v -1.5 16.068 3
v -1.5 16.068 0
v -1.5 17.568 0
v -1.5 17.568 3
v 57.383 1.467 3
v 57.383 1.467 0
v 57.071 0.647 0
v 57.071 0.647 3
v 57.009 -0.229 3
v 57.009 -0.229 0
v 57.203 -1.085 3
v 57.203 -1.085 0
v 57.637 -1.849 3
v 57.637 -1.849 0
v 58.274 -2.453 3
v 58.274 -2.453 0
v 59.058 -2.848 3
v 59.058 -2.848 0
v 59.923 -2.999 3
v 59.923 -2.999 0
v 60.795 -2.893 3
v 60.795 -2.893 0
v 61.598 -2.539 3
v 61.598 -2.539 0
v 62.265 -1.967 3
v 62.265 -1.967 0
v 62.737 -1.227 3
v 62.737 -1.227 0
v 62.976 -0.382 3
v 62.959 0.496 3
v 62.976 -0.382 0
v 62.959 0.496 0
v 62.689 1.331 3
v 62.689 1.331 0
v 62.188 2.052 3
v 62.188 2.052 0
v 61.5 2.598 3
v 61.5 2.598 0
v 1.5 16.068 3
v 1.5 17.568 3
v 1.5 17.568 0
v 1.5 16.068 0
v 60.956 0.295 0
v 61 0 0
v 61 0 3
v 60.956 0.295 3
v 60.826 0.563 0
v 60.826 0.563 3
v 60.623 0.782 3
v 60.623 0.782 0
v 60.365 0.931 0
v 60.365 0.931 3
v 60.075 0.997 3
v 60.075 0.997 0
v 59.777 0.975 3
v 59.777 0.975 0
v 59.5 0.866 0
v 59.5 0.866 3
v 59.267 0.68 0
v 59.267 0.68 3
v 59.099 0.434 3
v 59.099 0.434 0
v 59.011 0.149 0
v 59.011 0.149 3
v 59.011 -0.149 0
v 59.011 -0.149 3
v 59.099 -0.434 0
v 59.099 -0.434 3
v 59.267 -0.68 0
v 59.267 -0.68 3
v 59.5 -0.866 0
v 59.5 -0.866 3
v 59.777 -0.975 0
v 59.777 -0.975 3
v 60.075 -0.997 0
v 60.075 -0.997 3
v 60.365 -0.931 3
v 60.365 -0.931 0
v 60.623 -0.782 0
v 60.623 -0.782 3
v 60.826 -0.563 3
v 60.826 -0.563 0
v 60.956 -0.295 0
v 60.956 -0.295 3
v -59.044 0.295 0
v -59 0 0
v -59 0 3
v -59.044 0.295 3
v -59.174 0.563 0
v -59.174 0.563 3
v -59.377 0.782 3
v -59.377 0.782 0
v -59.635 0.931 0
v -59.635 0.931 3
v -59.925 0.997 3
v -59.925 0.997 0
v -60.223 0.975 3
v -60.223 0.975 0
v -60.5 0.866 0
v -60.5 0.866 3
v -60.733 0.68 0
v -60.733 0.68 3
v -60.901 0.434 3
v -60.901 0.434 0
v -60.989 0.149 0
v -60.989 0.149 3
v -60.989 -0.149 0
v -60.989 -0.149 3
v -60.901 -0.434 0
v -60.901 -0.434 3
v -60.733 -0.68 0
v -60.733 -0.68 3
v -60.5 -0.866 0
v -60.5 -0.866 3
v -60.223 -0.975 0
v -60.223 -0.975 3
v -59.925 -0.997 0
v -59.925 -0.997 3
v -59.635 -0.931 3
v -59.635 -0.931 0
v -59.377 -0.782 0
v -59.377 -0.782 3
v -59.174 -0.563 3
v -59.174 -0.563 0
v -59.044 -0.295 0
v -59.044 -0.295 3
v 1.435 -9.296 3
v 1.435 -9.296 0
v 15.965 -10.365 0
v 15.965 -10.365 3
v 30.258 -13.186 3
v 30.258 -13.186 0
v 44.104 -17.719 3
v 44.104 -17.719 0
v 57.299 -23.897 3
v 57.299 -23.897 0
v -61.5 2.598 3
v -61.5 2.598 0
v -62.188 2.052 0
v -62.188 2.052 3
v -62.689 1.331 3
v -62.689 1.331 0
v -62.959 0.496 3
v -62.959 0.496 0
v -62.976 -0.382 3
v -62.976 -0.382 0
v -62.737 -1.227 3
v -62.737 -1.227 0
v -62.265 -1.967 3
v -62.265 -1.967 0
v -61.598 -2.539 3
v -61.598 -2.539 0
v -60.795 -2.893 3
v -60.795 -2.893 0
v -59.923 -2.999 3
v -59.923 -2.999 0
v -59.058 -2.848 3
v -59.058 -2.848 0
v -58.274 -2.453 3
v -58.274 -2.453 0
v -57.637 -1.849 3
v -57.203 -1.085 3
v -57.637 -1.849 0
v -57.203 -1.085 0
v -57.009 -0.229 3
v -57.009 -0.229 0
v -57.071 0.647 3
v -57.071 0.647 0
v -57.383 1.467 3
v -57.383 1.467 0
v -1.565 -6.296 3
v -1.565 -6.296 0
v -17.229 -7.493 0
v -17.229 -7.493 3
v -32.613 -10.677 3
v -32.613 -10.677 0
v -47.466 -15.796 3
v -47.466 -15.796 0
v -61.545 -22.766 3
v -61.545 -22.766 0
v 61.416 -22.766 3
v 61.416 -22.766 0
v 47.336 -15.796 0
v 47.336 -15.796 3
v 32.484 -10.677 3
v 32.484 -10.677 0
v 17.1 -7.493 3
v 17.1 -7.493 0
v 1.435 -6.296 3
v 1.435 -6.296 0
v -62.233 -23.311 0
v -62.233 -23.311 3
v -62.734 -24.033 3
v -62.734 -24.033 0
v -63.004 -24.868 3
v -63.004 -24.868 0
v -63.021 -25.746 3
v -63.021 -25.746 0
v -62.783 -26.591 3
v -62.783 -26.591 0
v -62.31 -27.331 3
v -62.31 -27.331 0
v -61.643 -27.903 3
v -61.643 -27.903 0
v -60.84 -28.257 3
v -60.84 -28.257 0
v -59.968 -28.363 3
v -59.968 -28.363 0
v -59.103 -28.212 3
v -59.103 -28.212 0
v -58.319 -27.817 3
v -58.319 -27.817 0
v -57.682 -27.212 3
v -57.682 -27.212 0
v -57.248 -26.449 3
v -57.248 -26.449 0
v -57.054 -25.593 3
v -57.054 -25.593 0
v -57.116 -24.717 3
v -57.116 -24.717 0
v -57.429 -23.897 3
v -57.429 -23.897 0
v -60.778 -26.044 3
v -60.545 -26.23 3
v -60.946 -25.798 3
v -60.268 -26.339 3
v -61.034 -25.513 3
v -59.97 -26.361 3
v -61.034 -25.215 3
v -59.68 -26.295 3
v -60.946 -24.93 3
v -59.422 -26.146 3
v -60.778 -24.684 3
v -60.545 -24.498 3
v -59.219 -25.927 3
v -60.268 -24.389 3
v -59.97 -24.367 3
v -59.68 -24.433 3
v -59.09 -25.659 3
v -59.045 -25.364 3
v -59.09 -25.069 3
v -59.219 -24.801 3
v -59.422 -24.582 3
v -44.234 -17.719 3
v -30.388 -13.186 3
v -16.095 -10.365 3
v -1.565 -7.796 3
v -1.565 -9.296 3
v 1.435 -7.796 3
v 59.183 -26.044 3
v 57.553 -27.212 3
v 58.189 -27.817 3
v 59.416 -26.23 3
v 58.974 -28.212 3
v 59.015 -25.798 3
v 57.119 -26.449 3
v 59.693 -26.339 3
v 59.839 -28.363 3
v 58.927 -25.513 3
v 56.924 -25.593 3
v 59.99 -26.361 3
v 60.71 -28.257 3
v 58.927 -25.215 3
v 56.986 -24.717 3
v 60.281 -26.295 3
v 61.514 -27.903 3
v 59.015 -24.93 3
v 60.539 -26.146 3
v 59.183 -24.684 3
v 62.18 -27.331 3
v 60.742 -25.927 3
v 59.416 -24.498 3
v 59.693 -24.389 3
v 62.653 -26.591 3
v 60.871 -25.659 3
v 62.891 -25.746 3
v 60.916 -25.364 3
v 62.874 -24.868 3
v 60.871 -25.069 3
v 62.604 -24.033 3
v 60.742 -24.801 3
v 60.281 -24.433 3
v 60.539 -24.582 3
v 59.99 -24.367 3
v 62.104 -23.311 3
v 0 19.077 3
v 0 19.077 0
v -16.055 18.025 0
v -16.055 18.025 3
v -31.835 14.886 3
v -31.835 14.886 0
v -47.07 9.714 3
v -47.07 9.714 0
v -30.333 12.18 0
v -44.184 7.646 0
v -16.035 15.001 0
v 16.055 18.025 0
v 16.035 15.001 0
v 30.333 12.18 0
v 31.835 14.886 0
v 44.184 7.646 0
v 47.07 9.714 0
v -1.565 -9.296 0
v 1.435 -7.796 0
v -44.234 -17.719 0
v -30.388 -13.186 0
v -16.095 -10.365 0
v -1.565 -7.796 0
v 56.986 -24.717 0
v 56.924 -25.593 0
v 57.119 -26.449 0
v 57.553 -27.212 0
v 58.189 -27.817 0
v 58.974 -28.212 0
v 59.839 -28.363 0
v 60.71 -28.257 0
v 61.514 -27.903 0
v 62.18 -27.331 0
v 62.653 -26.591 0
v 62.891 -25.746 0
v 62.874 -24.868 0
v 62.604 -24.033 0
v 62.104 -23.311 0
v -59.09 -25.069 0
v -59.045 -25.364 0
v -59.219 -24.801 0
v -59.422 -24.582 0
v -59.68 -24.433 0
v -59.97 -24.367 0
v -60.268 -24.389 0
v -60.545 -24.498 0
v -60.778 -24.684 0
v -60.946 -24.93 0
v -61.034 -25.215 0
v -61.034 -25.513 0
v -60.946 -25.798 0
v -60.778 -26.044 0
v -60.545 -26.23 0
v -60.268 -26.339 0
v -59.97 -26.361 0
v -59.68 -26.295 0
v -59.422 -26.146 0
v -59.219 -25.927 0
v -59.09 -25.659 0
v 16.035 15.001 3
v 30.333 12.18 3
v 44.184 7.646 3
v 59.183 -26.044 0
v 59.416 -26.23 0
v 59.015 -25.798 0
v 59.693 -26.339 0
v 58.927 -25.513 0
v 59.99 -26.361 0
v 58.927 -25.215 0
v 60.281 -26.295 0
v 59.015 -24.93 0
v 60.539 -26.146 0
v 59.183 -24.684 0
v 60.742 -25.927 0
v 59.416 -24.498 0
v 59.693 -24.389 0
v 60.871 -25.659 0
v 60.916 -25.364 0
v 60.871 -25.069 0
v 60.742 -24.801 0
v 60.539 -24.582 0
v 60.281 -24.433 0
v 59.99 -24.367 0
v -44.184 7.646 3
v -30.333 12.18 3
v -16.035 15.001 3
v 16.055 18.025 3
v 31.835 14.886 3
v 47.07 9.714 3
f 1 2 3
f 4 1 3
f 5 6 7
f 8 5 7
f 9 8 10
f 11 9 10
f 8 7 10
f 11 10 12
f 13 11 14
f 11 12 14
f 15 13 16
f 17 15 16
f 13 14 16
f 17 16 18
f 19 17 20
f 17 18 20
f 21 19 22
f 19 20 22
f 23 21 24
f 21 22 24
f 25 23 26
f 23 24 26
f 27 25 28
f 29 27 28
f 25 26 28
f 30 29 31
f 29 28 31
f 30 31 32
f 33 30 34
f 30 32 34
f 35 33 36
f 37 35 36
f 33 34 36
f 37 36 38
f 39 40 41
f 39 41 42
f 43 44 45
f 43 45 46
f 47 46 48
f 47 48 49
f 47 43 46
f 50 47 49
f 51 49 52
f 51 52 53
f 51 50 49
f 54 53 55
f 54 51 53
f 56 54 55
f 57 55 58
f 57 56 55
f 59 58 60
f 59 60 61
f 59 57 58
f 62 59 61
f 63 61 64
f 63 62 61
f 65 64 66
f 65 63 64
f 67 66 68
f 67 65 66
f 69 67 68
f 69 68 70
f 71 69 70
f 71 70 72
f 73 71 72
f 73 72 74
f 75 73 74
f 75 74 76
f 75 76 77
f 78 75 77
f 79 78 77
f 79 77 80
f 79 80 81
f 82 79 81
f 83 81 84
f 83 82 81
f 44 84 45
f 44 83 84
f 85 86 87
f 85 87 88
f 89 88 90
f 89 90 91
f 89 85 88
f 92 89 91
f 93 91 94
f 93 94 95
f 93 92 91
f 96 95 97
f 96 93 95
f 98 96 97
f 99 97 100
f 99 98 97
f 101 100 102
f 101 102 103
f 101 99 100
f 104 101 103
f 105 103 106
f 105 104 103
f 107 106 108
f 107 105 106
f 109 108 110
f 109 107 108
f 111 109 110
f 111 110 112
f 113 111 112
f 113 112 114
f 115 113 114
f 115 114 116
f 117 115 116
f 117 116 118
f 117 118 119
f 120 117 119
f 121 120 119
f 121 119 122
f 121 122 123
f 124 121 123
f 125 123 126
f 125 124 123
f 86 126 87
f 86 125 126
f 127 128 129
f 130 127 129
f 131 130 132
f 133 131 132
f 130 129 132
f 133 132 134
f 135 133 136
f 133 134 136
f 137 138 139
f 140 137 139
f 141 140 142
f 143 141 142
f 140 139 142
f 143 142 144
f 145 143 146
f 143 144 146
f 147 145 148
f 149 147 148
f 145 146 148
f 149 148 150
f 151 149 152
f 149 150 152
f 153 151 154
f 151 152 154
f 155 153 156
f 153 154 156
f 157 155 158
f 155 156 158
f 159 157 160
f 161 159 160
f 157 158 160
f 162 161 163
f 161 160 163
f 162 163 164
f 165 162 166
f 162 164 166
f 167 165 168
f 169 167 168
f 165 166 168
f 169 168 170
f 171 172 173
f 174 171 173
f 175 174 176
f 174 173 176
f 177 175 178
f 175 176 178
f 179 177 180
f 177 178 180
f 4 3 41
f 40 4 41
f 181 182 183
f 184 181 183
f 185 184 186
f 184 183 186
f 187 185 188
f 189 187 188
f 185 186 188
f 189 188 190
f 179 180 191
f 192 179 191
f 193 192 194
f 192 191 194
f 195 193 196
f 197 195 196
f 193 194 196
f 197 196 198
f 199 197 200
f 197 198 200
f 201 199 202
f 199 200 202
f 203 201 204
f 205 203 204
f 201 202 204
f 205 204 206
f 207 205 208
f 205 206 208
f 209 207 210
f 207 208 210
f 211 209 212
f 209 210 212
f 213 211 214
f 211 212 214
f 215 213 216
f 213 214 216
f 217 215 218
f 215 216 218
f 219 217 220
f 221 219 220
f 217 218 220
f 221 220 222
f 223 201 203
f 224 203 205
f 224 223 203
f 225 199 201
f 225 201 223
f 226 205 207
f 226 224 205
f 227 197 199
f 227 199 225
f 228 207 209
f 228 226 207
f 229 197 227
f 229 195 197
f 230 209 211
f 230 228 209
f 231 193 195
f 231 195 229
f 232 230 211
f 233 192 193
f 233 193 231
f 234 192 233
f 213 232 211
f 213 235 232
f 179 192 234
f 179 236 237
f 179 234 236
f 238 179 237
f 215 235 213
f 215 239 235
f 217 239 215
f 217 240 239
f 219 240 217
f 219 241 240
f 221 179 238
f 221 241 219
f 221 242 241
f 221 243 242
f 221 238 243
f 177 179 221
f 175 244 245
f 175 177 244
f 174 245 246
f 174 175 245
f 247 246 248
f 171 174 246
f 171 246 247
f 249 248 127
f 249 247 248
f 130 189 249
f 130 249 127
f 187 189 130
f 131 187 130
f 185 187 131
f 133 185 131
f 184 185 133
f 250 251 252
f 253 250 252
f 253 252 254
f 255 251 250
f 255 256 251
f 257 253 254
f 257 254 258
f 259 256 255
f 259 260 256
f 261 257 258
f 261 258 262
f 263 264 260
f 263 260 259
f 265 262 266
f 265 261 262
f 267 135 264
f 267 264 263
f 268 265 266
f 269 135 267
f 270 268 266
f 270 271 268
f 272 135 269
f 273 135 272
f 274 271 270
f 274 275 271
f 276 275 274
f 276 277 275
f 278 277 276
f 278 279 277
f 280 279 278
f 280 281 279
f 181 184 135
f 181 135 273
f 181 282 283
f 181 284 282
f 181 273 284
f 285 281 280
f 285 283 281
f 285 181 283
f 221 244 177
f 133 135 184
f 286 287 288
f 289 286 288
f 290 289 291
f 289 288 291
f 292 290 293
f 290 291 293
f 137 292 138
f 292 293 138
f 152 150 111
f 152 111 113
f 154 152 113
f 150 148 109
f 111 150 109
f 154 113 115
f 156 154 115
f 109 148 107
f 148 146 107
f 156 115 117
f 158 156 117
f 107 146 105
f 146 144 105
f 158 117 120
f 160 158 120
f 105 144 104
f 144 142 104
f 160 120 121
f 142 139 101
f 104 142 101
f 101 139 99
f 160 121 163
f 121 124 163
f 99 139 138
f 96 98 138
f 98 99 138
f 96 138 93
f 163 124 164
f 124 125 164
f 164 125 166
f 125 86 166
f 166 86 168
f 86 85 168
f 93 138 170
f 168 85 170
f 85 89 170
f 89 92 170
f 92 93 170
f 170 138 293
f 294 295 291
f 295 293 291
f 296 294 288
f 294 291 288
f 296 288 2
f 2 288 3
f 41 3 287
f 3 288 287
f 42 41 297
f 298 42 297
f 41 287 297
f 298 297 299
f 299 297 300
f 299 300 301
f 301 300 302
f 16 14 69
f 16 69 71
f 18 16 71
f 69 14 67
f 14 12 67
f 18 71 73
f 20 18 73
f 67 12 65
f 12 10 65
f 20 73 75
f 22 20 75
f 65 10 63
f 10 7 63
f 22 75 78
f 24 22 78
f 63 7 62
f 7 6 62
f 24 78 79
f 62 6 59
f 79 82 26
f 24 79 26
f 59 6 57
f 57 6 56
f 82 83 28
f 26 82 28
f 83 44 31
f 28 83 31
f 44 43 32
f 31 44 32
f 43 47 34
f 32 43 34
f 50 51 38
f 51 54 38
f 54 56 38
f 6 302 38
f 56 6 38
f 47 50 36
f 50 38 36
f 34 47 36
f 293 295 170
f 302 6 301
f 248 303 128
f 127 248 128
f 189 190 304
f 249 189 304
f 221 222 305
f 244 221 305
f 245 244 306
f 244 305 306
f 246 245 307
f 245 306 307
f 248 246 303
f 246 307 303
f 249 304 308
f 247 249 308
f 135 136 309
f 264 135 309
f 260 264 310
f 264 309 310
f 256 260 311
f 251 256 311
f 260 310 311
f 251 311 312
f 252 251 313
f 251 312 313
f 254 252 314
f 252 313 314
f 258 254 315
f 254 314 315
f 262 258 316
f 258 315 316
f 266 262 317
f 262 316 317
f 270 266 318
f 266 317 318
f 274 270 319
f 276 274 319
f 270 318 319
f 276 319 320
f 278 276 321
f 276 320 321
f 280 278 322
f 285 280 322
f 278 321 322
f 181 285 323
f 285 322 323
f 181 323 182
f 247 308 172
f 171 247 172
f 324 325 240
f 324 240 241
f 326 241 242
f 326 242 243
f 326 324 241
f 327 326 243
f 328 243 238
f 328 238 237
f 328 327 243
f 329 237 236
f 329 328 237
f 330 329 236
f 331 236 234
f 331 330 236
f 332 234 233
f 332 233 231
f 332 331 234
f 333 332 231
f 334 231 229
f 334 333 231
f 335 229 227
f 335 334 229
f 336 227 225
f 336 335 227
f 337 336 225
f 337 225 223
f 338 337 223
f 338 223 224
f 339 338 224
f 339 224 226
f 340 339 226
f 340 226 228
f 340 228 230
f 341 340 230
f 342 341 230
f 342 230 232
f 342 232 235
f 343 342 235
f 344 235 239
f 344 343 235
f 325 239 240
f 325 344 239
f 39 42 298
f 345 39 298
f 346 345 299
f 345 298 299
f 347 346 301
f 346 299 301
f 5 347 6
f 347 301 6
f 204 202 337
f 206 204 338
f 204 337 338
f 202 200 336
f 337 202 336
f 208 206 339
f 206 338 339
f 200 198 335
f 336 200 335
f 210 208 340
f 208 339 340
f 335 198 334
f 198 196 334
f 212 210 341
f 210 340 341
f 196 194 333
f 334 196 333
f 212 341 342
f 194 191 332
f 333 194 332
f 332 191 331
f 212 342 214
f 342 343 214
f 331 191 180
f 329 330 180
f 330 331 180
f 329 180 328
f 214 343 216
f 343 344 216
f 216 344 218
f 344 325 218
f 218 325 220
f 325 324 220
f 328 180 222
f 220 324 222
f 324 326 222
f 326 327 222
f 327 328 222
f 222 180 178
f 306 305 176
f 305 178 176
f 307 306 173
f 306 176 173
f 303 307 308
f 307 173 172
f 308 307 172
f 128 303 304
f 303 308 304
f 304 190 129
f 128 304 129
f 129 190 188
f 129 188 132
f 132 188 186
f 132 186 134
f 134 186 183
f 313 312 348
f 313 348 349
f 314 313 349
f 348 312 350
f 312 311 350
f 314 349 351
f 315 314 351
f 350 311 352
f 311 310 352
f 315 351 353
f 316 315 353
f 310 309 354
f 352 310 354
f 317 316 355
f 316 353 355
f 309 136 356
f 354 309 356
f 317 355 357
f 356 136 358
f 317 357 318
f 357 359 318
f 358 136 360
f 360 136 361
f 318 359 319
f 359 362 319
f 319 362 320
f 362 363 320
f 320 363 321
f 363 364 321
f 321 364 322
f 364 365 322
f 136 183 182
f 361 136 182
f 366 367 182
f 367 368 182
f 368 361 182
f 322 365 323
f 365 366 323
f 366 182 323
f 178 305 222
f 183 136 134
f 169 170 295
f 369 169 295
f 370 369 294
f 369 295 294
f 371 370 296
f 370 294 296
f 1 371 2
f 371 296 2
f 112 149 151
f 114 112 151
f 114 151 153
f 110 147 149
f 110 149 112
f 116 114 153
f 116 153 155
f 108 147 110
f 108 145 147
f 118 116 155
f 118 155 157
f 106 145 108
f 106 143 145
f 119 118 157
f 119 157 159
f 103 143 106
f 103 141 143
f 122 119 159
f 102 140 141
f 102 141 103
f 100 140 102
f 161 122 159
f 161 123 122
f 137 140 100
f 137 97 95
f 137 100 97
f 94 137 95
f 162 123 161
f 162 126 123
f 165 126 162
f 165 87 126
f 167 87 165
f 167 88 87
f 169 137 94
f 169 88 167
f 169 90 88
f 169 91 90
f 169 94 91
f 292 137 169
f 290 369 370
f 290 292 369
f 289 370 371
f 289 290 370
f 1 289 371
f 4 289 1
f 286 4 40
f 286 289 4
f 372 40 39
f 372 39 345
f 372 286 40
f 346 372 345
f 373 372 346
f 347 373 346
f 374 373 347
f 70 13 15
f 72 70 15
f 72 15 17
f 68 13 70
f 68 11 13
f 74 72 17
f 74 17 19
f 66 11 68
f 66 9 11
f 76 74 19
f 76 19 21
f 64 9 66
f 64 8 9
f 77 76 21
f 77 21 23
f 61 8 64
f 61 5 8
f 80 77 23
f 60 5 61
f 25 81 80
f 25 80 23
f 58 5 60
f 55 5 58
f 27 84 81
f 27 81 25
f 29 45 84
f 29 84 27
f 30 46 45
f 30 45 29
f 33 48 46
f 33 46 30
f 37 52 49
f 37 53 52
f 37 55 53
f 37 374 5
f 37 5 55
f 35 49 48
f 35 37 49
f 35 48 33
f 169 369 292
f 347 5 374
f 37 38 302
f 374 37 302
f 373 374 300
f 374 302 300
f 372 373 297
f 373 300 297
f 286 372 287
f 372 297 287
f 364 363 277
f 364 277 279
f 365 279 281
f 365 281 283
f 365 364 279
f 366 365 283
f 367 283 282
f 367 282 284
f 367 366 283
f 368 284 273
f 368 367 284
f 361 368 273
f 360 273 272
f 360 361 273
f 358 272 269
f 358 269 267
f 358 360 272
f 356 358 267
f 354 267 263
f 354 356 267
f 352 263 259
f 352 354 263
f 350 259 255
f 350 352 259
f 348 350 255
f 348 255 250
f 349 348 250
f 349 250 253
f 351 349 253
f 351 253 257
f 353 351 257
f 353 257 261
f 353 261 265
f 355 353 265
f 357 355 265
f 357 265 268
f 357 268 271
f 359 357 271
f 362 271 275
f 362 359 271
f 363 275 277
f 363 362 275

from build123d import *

# Parameters (mm, degrees)
F0_R     = 1
F1_DEPTH = 3


with BuildPart() as f1:
    # F0 (on Top) → F1 (new body)
    with BuildSketch(Plane.XY):
        with BuildLine():
            ThreePointArc((61.5, 2.598076), (31.834743, 14.885828), (0, 19.076952))
            ThreePointArc((0, 19.076952), (-31.834743, 14.885828), (-61.5, 2.598076))
            ThreePointArc((-61.5, 2.598076), (-60.794553, -2.892868), (-57.383377, 1.467407))
            ThreePointArc((-57.383377, 1.467407), (-30.33322, 12.179905), (-1.5, 16.067576))
            Line((-1.5, 16.067576), (-1.5, 17.567576))
            Line((-1.5, 17.567576), (0, 17.567576))
            Line((0, 17.567576), (1.5, 17.567576))
            Line((1.5, 17.567576), (1.5, 16.067576))
            ThreePointArc((1.5, 16.067576), (30.33322, 12.179905), (57.383377, 1.467407))
            ThreePointArc((57.383377, 1.467407), (60.794553, -2.892868), (61.5, 2.598076))
        make_face()
        with Locations((-60, 0)):
            Circle(F0_R, mode=Mode.SUBTRACT)
        with Locations((60, 0)):
            Circle(F0_R, mode=Mode.SUBTRACT)
        with BuildLine():
            Line((-1.56474, -7.796415), (-1.56474, -6.296415))
            ThreePointArc((-1.56474, -6.296415), (-32.613202, -10.677072), (-61.545144, -22.765903))
            ThreePointArc((-61.545144, -22.765903), (-60.839697, -28.256847), (-57.428521, -23.896572))
            ThreePointArc((-57.428521, -23.896572), (-30.38786, -13.186431), (-1.56474, -9.296415))
            Line((-1.56474, -9.296415), (1.43526, -9.296415))
            ThreePointArc((1.43526, -9.296415), (30.258379, -13.186431), (57.29904, -23.896572))
            ThreePointArc((57.29904, -23.896572), (60.710217, -28.256847), (61.415663, -22.765903))
            ThreePointArc((61.415663, -22.765903), (32.483721, -10.677072), (1.43526, -6.296415))
            Line((1.43526, -6.296415), (1.43526, -7.796415))
            Line((1.43526, -7.796415), (-0.06474, -7.796415))
            Line((-0.06474, -7.796415), (-1.56474, -7.796415))
        make_face()
        with Locations((-60.045144, -25.363979)):
            Circle(F0_R, mode=Mode.SUBTRACT)
        with Locations((59.915663, -25.363979)):
            Circle(F0_R, mode=Mode.SUBTRACT)
    extrude(amount=F1_DEPTH)


solid = f1.part
